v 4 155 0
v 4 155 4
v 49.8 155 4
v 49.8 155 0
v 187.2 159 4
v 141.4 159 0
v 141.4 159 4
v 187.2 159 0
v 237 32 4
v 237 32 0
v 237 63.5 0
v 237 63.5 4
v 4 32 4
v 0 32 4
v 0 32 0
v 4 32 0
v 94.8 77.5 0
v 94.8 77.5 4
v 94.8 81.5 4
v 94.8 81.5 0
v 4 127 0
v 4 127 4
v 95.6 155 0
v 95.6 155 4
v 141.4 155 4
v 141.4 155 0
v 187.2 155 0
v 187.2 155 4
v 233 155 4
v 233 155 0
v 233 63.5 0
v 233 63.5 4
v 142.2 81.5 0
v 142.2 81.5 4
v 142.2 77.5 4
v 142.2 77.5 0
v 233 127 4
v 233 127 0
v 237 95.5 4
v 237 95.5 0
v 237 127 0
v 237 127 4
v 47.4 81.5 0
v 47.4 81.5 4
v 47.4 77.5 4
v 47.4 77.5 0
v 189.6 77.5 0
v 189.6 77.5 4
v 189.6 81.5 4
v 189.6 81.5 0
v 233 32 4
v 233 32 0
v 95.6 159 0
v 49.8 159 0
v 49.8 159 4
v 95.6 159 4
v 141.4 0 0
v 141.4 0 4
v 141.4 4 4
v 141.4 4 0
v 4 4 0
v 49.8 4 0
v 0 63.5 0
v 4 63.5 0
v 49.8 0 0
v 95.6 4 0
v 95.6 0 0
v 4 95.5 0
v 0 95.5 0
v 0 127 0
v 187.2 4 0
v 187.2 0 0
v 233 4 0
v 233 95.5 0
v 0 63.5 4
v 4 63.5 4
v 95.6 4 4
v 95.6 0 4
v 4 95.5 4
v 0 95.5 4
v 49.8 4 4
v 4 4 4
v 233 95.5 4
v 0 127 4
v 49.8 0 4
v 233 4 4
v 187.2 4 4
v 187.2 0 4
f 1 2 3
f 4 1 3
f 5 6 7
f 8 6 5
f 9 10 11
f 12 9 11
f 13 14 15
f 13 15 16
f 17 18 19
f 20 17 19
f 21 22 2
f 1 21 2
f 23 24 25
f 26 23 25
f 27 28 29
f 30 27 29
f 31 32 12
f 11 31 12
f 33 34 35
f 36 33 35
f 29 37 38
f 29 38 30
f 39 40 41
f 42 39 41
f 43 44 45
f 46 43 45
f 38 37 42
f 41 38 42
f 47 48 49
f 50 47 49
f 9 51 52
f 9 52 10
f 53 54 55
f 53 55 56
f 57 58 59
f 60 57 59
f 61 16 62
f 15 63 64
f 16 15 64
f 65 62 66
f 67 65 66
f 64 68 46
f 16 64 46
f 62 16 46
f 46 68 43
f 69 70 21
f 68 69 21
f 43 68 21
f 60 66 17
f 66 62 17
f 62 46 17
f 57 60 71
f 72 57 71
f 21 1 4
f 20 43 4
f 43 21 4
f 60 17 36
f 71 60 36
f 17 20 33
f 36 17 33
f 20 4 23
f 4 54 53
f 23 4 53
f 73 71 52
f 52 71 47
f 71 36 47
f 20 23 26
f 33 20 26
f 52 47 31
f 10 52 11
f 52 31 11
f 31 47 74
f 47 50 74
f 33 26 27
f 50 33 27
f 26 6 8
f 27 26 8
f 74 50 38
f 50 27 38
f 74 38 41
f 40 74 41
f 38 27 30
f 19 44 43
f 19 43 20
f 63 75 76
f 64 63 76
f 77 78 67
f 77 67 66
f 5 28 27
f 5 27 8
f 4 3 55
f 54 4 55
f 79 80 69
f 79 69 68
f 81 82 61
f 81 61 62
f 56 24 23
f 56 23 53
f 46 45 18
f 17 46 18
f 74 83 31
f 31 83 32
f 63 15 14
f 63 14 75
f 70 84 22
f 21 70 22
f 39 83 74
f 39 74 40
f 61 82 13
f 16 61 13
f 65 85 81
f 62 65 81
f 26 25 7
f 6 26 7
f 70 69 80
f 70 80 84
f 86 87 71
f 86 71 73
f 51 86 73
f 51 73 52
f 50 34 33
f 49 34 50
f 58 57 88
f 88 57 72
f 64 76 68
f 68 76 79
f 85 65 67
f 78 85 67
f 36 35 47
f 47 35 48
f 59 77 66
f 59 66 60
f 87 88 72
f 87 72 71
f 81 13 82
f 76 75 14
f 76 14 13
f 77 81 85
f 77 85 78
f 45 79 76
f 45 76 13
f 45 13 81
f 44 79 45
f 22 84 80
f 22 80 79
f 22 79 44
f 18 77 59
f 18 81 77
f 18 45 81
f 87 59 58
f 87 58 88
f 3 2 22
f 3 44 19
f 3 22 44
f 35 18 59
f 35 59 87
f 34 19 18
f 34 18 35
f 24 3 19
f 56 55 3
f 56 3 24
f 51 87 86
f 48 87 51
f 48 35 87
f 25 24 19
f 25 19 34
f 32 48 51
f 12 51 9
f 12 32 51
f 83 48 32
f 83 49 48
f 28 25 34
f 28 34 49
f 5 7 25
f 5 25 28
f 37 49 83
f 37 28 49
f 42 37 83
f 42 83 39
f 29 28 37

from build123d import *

# Parameters (mm, degrees)
F0_W     = 237
F0_H     = 159
F1_DEPTH = 4
F2_W     = 4
F2_H     = 32
F2_H_2   = 16
F3_DEPTH = 4
F4_W     = 45.8
F4_H     = 4
F5_DEPTH = 4
F6_W     = 47.4
F6_H     = 2
F7_DEPTH = 4


with BuildPart() as f1:
    # F0 (on Top) → F1 (new body)
    with BuildSketch(Plane.XY):
        with Locations((118.5, 79.5)):
            Rectangle(F0_W, F0_H)
    extrude(amount=F1_DEPTH)

    # F2 (on face) → F3 (cut, through all)
    with BuildSketch(Plane.XY.offset(4)):
        with Locations((2, 16)):
            Rectangle(F2_W, F2_H)
        with Locations((2, 71.5)):
            Rectangle(F2_W, F2_H_2)
        with Locations((2, 87.5)):
            Rectangle(F2_W, F2_H_2)
        with Locations((235, 71.5)):
            Rectangle(F2_W, F2_H_2)
        with Locations((235, 87.5)):
            Rectangle(F2_W, F2_H_2)
        with Locations((235, 16)):
            Rectangle(F2_W, F2_H)
        with Locations((235, 143)):
            Rectangle(F2_W, F2_H)
        with Locations((2, 143)):
            Rectangle(F2_W, F2_H)
    extrude(amount=-F3_DEPTH, mode=Mode.SUBTRACT)

    # F4 (on face) → F5 (cut, through all)
    with BuildSketch(Plane.XY.offset(4)):
        with Locations((26.9, 2)):
            Rectangle(F4_W, F4_H)
        with Locations((118.5, 2)):
            Rectangle(F4_W, F4_H)
        with Locations((210.1, 2)):
            Rectangle(F4_W, F4_H)
        with Locations((210.1, 157)):
            Rectangle(F4_W, F4_H)
        with Locations((26.9, 157)):
            Rectangle(F4_W, F4_H)
        with Locations((118.5, 157)):
            Rectangle(F4_W, F4_H)
    extrude(amount=-F5_DEPTH, mode=Mode.SUBTRACT)

    # F6 (on face) → F7 (cut, through all)
    with BuildSketch(Plane.XY.offset(4)):
        with Locations((71.1, 80.5)):
            Rectangle(F6_W, F6_H)
        with Locations((71.1, 78.5)):
            Rectangle(F6_W, F6_H)
        with Locations((165.9, 80.5)):
            Rectangle(F6_W, F6_H)
        with Locations((165.9, 78.5)):
            Rectangle(F6_W, F6_H)
    extrude(amount=-F7_DEPTH, mode=Mode.SUBTRACT)


solid = f1.part
